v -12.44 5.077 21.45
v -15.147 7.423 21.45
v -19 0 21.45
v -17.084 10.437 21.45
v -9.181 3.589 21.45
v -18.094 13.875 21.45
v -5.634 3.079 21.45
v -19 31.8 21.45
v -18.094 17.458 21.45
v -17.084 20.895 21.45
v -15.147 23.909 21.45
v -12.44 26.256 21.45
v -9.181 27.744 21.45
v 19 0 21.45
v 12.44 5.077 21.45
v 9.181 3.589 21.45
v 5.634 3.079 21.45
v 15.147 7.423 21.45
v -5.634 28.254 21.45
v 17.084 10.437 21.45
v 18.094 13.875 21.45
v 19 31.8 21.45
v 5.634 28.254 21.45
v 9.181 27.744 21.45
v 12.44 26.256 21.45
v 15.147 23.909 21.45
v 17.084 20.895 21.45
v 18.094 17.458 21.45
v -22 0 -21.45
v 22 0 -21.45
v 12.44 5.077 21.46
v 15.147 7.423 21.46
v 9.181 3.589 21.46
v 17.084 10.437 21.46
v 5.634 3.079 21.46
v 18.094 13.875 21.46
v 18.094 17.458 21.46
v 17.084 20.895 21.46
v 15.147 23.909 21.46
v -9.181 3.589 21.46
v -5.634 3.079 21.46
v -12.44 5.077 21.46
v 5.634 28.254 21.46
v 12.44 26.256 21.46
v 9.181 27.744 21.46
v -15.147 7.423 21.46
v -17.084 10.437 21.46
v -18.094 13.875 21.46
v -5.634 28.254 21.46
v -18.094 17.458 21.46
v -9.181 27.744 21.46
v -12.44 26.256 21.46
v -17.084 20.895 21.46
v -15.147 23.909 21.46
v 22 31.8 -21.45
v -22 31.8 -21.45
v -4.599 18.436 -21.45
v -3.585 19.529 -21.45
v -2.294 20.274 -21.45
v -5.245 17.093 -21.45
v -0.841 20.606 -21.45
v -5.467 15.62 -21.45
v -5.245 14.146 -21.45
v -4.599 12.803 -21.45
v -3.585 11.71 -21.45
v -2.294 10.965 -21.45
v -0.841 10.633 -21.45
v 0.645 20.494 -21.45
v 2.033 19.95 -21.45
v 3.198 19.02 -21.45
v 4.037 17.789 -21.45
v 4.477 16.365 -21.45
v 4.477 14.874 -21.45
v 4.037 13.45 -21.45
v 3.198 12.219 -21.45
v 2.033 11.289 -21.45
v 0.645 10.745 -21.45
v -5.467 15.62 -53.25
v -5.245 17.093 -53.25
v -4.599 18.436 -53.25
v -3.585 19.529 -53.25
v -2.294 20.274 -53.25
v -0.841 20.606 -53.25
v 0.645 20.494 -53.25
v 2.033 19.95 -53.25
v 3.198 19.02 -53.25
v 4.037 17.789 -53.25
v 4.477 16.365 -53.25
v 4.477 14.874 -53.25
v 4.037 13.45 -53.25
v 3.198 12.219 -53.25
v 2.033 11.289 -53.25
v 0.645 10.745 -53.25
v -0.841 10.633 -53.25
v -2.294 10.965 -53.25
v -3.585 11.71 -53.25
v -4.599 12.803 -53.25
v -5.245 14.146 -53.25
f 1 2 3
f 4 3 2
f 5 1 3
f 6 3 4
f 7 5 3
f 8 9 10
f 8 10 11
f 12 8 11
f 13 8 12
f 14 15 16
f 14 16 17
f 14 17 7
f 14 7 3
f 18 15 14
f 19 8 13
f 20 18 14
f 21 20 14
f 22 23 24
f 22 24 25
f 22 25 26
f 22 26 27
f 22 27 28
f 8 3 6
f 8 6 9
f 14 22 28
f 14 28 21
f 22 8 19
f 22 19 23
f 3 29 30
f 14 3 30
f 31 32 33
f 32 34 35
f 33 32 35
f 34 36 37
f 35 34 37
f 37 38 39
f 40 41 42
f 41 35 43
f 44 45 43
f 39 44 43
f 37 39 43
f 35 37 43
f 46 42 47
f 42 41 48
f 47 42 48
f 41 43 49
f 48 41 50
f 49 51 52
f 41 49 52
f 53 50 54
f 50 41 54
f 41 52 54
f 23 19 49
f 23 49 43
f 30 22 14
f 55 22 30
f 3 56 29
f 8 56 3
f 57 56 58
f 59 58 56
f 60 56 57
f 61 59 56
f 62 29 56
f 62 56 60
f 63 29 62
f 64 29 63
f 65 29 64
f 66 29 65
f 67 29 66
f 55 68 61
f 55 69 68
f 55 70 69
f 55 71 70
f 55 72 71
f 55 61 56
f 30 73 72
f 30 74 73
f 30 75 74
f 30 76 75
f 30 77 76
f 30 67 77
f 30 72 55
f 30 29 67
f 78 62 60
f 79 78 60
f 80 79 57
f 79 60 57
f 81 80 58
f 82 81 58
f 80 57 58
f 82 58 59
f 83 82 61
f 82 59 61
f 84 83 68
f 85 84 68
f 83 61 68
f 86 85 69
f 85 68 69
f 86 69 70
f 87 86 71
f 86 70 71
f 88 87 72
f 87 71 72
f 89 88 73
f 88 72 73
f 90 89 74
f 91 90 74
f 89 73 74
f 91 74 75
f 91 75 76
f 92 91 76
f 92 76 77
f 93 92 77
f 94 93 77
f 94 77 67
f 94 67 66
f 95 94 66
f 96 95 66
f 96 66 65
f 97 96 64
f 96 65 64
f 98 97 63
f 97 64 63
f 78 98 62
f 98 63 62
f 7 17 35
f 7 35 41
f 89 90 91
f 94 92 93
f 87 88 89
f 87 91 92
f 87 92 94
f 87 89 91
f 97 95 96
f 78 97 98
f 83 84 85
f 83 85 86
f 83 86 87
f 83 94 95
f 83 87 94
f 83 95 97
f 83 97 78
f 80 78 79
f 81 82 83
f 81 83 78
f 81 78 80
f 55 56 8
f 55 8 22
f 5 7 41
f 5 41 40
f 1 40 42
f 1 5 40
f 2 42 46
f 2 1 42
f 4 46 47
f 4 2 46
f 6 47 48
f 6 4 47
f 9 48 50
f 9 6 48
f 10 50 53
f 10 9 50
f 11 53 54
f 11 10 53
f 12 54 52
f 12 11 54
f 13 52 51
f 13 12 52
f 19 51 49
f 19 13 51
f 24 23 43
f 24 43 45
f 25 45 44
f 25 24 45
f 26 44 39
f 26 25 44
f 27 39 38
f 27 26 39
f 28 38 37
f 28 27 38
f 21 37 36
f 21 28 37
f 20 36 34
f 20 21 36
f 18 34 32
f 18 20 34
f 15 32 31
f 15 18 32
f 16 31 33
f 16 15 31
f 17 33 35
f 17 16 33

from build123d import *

# Parameters (mm, degrees)
SKETCH1_W           = 44
SKETCH1_H           = 42.9
BOSS_EXTRUDE1_DEPTH = 31.8
SKETCH2_OUTSIDE_W   = 59.838
SKETCH2_OUTSIDE_H   = 58.738
CUT_EXTRUDE1_DEPTH  = 31.8
SKETCH6_R           = 5
BOSS_EXTRUDE2_DEPTH = 31.8
BOSS_EXTRUDE3_DEPTH = 0.01


with BuildPart() as part:
    # Sketch1 → Boss-Extrude1 (new body)
    with BuildSketch(Plane(origin=(0, 0, 0), x_dir=(1, 0, 0), z_dir=(0, 1, 0))):
        Rectangle(SKETCH1_W, SKETCH1_H)
    extrude(amount=BOSS_EXTRUDE1_DEPTH)

    # Sketch2 outside → Cut-Extrude1 (cut)
    with BuildSketch(Plane(origin=(0, 31.8, 0), x_dir=(1, 0, 0), z_dir=(0, 1, 0))):
        Rectangle(SKETCH2_OUTSIDE_W, SKETCH2_OUTSIDE_H)
        Polygon((-22, 21.45), (-19, -21.45), (19, -21.45), (22, 21.45), align=None, mode=Mode.SUBTRACT)
    extrude(amount=-CUT_EXTRUDE1_DEPTH, mode=Mode.SUBTRACT)

    # Sketch6 → Boss-Extrude2 (add)
    with BuildSketch(Plane(origin=(0, 0, -21.45), x_dir=(-1, 0, 0), z_dir=(0, 0, -1))):
        with Locations((0.467474435, 15.619515339)):
            Circle(SKETCH6_R)
    extrude(amount=BOSS_EXTRUDE2_DEPTH)

    # Sketch7 → Boss-Extrude3 (add)
    with BuildSketch(Plane.XY.offset(21.45)):
        with BuildLine():
            Line((5.634249571, 3.078676804), (-5.634249571, 3.078676804))
            ThreePointArc((-5.634249571, 3.078676804), (-18.221835549, 15.666262783), (-5.634249571, 28.253848761))
            Line((-5.634249571, 28.253848761), (5.634249571, 28.253848761))
            ThreePointArc((5.634249571, 28.253848761), (18.221835549, 15.666262783), (5.634249571, 3.078676804))
        make_face()
    extrude(amount=BOSS_EXTRUDE3_DEPTH)


solid = part.part
